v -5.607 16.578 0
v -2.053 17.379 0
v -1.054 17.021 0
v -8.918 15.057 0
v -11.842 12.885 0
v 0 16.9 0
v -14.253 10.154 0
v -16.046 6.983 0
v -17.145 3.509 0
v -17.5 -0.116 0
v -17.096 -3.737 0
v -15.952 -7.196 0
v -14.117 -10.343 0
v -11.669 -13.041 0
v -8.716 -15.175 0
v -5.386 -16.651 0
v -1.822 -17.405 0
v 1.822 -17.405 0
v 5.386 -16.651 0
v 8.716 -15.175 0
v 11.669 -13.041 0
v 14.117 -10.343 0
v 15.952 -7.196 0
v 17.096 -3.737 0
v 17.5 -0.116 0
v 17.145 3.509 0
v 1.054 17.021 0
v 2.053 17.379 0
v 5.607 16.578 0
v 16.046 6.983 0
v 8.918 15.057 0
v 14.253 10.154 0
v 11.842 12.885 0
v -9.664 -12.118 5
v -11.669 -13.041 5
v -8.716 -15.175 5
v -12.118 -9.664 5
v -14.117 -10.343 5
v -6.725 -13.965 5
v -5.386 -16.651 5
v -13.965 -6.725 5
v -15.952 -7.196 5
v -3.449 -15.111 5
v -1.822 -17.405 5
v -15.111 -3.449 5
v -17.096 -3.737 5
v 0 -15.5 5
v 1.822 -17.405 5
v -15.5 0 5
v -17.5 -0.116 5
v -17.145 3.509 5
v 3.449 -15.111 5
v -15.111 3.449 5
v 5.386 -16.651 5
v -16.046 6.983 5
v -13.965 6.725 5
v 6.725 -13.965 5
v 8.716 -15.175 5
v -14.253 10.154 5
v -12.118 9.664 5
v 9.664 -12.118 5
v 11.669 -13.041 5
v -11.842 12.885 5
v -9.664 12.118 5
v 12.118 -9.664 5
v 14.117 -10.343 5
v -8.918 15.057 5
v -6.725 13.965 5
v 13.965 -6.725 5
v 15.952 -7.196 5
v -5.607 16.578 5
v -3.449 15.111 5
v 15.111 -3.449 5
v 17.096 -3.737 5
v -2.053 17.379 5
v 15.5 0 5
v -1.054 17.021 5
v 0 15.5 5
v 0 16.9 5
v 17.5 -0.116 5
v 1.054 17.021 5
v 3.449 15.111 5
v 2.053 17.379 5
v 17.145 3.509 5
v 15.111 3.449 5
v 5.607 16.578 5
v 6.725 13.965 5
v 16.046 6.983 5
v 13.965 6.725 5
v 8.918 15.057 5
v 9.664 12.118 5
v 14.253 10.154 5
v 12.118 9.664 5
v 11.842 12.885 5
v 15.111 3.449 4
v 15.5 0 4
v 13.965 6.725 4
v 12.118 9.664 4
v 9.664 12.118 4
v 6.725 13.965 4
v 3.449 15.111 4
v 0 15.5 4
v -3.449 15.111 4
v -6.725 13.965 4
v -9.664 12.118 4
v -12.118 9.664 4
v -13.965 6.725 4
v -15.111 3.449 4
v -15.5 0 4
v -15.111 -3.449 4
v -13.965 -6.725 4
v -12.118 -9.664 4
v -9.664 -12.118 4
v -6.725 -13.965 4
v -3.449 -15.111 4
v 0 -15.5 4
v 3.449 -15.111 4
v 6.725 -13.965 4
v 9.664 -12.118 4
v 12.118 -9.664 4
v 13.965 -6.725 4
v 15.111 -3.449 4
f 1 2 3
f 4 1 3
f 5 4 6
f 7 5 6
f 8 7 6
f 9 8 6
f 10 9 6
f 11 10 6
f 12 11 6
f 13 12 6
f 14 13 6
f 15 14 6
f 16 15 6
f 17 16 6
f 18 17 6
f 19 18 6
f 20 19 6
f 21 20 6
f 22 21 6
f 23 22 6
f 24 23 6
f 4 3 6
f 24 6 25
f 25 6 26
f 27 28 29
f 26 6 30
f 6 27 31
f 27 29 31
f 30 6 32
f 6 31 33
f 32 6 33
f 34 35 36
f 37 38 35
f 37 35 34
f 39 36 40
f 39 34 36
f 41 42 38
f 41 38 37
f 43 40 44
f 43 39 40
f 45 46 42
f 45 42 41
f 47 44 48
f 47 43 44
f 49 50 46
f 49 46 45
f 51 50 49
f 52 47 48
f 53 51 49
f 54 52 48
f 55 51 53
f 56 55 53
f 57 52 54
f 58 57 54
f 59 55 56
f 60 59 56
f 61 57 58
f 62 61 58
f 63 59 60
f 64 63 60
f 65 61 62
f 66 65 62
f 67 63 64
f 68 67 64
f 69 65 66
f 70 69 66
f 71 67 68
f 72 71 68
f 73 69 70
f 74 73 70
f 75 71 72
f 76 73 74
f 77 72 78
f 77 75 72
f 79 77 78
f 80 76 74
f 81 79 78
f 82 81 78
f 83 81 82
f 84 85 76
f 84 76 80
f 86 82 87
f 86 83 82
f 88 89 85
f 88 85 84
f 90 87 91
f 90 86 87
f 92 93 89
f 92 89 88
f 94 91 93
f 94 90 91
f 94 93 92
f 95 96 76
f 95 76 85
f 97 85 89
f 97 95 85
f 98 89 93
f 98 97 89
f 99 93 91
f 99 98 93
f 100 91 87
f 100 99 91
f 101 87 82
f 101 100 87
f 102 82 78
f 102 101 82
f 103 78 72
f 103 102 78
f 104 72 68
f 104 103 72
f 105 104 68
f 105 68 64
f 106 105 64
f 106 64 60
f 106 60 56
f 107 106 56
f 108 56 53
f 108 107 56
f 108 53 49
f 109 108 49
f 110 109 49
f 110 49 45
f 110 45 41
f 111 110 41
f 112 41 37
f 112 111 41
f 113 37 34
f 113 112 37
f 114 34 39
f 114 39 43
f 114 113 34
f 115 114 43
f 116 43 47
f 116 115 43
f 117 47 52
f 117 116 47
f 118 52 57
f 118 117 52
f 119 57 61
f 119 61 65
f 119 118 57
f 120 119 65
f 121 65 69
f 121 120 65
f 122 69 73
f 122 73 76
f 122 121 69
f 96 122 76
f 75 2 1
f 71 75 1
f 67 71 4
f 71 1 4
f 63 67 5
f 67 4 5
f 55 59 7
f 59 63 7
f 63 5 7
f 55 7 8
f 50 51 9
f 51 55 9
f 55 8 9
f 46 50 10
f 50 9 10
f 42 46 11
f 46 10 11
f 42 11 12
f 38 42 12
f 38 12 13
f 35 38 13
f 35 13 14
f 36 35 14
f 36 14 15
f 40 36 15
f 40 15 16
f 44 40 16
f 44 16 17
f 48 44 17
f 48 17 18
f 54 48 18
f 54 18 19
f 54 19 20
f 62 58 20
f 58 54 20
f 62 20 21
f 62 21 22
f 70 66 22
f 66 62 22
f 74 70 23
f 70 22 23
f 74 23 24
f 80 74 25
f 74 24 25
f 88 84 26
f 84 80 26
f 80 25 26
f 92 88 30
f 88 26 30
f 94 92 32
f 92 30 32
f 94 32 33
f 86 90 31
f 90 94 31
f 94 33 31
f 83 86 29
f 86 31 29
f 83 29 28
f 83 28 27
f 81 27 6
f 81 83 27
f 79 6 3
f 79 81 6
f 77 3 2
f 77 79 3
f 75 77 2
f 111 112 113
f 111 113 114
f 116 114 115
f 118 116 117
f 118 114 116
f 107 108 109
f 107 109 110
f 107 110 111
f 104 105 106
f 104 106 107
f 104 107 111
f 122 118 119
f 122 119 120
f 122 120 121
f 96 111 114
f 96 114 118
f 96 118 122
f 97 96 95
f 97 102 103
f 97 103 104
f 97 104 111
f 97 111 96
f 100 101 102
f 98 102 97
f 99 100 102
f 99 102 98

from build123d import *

# Parameters (mm, degrees)
F0_R     = 17.5
F1_DEPTH = 4
F2_R     = 17.5
F2_R_2   = 15.5
F3_DEPTH = 1
F4_R     = 15.5
F5_DEPTH = 25


with BuildPart() as f1:
    # F0 (on Top) → F1 (new body)
    with BuildSketch(Plane.XY):
        Circle(F0_R)
    extrude(amount=F1_DEPTH)

    # F2 (on face) → F3 (join)
    with BuildSketch(Plane.XY.offset(4)):
        Circle(F2_R)
        Circle(F2_R_2, mode=Mode.SUBTRACT)
    extrude(amount=F3_DEPTH)

    # F4 (on face) → F5 (intersect)
    with BuildSketch(Plane.XY.offset(5)):
        with BuildLine():
            ThreePointArc((2.0529786403, 17.3791621979), (0, 16.8999925429), (-2.0529786403, 17.3791621979))
            ThreePointArc((-2.0529786403, 17.3791621979), (-11.6258951009, -13.0800826872), (17.5, 0))
            ThreePointArc((17.5, 0), (13.0800826872, 11.6258951009), (2.0529786403, 17.3791621979))
        make_face()
        Circle(F4_R, mode=Mode.SUBTRACT)
        Circle(F4_R)
    extrude(amount=-F5_DEPTH, mode=Mode.INTERSECT)


solid = f1.part
